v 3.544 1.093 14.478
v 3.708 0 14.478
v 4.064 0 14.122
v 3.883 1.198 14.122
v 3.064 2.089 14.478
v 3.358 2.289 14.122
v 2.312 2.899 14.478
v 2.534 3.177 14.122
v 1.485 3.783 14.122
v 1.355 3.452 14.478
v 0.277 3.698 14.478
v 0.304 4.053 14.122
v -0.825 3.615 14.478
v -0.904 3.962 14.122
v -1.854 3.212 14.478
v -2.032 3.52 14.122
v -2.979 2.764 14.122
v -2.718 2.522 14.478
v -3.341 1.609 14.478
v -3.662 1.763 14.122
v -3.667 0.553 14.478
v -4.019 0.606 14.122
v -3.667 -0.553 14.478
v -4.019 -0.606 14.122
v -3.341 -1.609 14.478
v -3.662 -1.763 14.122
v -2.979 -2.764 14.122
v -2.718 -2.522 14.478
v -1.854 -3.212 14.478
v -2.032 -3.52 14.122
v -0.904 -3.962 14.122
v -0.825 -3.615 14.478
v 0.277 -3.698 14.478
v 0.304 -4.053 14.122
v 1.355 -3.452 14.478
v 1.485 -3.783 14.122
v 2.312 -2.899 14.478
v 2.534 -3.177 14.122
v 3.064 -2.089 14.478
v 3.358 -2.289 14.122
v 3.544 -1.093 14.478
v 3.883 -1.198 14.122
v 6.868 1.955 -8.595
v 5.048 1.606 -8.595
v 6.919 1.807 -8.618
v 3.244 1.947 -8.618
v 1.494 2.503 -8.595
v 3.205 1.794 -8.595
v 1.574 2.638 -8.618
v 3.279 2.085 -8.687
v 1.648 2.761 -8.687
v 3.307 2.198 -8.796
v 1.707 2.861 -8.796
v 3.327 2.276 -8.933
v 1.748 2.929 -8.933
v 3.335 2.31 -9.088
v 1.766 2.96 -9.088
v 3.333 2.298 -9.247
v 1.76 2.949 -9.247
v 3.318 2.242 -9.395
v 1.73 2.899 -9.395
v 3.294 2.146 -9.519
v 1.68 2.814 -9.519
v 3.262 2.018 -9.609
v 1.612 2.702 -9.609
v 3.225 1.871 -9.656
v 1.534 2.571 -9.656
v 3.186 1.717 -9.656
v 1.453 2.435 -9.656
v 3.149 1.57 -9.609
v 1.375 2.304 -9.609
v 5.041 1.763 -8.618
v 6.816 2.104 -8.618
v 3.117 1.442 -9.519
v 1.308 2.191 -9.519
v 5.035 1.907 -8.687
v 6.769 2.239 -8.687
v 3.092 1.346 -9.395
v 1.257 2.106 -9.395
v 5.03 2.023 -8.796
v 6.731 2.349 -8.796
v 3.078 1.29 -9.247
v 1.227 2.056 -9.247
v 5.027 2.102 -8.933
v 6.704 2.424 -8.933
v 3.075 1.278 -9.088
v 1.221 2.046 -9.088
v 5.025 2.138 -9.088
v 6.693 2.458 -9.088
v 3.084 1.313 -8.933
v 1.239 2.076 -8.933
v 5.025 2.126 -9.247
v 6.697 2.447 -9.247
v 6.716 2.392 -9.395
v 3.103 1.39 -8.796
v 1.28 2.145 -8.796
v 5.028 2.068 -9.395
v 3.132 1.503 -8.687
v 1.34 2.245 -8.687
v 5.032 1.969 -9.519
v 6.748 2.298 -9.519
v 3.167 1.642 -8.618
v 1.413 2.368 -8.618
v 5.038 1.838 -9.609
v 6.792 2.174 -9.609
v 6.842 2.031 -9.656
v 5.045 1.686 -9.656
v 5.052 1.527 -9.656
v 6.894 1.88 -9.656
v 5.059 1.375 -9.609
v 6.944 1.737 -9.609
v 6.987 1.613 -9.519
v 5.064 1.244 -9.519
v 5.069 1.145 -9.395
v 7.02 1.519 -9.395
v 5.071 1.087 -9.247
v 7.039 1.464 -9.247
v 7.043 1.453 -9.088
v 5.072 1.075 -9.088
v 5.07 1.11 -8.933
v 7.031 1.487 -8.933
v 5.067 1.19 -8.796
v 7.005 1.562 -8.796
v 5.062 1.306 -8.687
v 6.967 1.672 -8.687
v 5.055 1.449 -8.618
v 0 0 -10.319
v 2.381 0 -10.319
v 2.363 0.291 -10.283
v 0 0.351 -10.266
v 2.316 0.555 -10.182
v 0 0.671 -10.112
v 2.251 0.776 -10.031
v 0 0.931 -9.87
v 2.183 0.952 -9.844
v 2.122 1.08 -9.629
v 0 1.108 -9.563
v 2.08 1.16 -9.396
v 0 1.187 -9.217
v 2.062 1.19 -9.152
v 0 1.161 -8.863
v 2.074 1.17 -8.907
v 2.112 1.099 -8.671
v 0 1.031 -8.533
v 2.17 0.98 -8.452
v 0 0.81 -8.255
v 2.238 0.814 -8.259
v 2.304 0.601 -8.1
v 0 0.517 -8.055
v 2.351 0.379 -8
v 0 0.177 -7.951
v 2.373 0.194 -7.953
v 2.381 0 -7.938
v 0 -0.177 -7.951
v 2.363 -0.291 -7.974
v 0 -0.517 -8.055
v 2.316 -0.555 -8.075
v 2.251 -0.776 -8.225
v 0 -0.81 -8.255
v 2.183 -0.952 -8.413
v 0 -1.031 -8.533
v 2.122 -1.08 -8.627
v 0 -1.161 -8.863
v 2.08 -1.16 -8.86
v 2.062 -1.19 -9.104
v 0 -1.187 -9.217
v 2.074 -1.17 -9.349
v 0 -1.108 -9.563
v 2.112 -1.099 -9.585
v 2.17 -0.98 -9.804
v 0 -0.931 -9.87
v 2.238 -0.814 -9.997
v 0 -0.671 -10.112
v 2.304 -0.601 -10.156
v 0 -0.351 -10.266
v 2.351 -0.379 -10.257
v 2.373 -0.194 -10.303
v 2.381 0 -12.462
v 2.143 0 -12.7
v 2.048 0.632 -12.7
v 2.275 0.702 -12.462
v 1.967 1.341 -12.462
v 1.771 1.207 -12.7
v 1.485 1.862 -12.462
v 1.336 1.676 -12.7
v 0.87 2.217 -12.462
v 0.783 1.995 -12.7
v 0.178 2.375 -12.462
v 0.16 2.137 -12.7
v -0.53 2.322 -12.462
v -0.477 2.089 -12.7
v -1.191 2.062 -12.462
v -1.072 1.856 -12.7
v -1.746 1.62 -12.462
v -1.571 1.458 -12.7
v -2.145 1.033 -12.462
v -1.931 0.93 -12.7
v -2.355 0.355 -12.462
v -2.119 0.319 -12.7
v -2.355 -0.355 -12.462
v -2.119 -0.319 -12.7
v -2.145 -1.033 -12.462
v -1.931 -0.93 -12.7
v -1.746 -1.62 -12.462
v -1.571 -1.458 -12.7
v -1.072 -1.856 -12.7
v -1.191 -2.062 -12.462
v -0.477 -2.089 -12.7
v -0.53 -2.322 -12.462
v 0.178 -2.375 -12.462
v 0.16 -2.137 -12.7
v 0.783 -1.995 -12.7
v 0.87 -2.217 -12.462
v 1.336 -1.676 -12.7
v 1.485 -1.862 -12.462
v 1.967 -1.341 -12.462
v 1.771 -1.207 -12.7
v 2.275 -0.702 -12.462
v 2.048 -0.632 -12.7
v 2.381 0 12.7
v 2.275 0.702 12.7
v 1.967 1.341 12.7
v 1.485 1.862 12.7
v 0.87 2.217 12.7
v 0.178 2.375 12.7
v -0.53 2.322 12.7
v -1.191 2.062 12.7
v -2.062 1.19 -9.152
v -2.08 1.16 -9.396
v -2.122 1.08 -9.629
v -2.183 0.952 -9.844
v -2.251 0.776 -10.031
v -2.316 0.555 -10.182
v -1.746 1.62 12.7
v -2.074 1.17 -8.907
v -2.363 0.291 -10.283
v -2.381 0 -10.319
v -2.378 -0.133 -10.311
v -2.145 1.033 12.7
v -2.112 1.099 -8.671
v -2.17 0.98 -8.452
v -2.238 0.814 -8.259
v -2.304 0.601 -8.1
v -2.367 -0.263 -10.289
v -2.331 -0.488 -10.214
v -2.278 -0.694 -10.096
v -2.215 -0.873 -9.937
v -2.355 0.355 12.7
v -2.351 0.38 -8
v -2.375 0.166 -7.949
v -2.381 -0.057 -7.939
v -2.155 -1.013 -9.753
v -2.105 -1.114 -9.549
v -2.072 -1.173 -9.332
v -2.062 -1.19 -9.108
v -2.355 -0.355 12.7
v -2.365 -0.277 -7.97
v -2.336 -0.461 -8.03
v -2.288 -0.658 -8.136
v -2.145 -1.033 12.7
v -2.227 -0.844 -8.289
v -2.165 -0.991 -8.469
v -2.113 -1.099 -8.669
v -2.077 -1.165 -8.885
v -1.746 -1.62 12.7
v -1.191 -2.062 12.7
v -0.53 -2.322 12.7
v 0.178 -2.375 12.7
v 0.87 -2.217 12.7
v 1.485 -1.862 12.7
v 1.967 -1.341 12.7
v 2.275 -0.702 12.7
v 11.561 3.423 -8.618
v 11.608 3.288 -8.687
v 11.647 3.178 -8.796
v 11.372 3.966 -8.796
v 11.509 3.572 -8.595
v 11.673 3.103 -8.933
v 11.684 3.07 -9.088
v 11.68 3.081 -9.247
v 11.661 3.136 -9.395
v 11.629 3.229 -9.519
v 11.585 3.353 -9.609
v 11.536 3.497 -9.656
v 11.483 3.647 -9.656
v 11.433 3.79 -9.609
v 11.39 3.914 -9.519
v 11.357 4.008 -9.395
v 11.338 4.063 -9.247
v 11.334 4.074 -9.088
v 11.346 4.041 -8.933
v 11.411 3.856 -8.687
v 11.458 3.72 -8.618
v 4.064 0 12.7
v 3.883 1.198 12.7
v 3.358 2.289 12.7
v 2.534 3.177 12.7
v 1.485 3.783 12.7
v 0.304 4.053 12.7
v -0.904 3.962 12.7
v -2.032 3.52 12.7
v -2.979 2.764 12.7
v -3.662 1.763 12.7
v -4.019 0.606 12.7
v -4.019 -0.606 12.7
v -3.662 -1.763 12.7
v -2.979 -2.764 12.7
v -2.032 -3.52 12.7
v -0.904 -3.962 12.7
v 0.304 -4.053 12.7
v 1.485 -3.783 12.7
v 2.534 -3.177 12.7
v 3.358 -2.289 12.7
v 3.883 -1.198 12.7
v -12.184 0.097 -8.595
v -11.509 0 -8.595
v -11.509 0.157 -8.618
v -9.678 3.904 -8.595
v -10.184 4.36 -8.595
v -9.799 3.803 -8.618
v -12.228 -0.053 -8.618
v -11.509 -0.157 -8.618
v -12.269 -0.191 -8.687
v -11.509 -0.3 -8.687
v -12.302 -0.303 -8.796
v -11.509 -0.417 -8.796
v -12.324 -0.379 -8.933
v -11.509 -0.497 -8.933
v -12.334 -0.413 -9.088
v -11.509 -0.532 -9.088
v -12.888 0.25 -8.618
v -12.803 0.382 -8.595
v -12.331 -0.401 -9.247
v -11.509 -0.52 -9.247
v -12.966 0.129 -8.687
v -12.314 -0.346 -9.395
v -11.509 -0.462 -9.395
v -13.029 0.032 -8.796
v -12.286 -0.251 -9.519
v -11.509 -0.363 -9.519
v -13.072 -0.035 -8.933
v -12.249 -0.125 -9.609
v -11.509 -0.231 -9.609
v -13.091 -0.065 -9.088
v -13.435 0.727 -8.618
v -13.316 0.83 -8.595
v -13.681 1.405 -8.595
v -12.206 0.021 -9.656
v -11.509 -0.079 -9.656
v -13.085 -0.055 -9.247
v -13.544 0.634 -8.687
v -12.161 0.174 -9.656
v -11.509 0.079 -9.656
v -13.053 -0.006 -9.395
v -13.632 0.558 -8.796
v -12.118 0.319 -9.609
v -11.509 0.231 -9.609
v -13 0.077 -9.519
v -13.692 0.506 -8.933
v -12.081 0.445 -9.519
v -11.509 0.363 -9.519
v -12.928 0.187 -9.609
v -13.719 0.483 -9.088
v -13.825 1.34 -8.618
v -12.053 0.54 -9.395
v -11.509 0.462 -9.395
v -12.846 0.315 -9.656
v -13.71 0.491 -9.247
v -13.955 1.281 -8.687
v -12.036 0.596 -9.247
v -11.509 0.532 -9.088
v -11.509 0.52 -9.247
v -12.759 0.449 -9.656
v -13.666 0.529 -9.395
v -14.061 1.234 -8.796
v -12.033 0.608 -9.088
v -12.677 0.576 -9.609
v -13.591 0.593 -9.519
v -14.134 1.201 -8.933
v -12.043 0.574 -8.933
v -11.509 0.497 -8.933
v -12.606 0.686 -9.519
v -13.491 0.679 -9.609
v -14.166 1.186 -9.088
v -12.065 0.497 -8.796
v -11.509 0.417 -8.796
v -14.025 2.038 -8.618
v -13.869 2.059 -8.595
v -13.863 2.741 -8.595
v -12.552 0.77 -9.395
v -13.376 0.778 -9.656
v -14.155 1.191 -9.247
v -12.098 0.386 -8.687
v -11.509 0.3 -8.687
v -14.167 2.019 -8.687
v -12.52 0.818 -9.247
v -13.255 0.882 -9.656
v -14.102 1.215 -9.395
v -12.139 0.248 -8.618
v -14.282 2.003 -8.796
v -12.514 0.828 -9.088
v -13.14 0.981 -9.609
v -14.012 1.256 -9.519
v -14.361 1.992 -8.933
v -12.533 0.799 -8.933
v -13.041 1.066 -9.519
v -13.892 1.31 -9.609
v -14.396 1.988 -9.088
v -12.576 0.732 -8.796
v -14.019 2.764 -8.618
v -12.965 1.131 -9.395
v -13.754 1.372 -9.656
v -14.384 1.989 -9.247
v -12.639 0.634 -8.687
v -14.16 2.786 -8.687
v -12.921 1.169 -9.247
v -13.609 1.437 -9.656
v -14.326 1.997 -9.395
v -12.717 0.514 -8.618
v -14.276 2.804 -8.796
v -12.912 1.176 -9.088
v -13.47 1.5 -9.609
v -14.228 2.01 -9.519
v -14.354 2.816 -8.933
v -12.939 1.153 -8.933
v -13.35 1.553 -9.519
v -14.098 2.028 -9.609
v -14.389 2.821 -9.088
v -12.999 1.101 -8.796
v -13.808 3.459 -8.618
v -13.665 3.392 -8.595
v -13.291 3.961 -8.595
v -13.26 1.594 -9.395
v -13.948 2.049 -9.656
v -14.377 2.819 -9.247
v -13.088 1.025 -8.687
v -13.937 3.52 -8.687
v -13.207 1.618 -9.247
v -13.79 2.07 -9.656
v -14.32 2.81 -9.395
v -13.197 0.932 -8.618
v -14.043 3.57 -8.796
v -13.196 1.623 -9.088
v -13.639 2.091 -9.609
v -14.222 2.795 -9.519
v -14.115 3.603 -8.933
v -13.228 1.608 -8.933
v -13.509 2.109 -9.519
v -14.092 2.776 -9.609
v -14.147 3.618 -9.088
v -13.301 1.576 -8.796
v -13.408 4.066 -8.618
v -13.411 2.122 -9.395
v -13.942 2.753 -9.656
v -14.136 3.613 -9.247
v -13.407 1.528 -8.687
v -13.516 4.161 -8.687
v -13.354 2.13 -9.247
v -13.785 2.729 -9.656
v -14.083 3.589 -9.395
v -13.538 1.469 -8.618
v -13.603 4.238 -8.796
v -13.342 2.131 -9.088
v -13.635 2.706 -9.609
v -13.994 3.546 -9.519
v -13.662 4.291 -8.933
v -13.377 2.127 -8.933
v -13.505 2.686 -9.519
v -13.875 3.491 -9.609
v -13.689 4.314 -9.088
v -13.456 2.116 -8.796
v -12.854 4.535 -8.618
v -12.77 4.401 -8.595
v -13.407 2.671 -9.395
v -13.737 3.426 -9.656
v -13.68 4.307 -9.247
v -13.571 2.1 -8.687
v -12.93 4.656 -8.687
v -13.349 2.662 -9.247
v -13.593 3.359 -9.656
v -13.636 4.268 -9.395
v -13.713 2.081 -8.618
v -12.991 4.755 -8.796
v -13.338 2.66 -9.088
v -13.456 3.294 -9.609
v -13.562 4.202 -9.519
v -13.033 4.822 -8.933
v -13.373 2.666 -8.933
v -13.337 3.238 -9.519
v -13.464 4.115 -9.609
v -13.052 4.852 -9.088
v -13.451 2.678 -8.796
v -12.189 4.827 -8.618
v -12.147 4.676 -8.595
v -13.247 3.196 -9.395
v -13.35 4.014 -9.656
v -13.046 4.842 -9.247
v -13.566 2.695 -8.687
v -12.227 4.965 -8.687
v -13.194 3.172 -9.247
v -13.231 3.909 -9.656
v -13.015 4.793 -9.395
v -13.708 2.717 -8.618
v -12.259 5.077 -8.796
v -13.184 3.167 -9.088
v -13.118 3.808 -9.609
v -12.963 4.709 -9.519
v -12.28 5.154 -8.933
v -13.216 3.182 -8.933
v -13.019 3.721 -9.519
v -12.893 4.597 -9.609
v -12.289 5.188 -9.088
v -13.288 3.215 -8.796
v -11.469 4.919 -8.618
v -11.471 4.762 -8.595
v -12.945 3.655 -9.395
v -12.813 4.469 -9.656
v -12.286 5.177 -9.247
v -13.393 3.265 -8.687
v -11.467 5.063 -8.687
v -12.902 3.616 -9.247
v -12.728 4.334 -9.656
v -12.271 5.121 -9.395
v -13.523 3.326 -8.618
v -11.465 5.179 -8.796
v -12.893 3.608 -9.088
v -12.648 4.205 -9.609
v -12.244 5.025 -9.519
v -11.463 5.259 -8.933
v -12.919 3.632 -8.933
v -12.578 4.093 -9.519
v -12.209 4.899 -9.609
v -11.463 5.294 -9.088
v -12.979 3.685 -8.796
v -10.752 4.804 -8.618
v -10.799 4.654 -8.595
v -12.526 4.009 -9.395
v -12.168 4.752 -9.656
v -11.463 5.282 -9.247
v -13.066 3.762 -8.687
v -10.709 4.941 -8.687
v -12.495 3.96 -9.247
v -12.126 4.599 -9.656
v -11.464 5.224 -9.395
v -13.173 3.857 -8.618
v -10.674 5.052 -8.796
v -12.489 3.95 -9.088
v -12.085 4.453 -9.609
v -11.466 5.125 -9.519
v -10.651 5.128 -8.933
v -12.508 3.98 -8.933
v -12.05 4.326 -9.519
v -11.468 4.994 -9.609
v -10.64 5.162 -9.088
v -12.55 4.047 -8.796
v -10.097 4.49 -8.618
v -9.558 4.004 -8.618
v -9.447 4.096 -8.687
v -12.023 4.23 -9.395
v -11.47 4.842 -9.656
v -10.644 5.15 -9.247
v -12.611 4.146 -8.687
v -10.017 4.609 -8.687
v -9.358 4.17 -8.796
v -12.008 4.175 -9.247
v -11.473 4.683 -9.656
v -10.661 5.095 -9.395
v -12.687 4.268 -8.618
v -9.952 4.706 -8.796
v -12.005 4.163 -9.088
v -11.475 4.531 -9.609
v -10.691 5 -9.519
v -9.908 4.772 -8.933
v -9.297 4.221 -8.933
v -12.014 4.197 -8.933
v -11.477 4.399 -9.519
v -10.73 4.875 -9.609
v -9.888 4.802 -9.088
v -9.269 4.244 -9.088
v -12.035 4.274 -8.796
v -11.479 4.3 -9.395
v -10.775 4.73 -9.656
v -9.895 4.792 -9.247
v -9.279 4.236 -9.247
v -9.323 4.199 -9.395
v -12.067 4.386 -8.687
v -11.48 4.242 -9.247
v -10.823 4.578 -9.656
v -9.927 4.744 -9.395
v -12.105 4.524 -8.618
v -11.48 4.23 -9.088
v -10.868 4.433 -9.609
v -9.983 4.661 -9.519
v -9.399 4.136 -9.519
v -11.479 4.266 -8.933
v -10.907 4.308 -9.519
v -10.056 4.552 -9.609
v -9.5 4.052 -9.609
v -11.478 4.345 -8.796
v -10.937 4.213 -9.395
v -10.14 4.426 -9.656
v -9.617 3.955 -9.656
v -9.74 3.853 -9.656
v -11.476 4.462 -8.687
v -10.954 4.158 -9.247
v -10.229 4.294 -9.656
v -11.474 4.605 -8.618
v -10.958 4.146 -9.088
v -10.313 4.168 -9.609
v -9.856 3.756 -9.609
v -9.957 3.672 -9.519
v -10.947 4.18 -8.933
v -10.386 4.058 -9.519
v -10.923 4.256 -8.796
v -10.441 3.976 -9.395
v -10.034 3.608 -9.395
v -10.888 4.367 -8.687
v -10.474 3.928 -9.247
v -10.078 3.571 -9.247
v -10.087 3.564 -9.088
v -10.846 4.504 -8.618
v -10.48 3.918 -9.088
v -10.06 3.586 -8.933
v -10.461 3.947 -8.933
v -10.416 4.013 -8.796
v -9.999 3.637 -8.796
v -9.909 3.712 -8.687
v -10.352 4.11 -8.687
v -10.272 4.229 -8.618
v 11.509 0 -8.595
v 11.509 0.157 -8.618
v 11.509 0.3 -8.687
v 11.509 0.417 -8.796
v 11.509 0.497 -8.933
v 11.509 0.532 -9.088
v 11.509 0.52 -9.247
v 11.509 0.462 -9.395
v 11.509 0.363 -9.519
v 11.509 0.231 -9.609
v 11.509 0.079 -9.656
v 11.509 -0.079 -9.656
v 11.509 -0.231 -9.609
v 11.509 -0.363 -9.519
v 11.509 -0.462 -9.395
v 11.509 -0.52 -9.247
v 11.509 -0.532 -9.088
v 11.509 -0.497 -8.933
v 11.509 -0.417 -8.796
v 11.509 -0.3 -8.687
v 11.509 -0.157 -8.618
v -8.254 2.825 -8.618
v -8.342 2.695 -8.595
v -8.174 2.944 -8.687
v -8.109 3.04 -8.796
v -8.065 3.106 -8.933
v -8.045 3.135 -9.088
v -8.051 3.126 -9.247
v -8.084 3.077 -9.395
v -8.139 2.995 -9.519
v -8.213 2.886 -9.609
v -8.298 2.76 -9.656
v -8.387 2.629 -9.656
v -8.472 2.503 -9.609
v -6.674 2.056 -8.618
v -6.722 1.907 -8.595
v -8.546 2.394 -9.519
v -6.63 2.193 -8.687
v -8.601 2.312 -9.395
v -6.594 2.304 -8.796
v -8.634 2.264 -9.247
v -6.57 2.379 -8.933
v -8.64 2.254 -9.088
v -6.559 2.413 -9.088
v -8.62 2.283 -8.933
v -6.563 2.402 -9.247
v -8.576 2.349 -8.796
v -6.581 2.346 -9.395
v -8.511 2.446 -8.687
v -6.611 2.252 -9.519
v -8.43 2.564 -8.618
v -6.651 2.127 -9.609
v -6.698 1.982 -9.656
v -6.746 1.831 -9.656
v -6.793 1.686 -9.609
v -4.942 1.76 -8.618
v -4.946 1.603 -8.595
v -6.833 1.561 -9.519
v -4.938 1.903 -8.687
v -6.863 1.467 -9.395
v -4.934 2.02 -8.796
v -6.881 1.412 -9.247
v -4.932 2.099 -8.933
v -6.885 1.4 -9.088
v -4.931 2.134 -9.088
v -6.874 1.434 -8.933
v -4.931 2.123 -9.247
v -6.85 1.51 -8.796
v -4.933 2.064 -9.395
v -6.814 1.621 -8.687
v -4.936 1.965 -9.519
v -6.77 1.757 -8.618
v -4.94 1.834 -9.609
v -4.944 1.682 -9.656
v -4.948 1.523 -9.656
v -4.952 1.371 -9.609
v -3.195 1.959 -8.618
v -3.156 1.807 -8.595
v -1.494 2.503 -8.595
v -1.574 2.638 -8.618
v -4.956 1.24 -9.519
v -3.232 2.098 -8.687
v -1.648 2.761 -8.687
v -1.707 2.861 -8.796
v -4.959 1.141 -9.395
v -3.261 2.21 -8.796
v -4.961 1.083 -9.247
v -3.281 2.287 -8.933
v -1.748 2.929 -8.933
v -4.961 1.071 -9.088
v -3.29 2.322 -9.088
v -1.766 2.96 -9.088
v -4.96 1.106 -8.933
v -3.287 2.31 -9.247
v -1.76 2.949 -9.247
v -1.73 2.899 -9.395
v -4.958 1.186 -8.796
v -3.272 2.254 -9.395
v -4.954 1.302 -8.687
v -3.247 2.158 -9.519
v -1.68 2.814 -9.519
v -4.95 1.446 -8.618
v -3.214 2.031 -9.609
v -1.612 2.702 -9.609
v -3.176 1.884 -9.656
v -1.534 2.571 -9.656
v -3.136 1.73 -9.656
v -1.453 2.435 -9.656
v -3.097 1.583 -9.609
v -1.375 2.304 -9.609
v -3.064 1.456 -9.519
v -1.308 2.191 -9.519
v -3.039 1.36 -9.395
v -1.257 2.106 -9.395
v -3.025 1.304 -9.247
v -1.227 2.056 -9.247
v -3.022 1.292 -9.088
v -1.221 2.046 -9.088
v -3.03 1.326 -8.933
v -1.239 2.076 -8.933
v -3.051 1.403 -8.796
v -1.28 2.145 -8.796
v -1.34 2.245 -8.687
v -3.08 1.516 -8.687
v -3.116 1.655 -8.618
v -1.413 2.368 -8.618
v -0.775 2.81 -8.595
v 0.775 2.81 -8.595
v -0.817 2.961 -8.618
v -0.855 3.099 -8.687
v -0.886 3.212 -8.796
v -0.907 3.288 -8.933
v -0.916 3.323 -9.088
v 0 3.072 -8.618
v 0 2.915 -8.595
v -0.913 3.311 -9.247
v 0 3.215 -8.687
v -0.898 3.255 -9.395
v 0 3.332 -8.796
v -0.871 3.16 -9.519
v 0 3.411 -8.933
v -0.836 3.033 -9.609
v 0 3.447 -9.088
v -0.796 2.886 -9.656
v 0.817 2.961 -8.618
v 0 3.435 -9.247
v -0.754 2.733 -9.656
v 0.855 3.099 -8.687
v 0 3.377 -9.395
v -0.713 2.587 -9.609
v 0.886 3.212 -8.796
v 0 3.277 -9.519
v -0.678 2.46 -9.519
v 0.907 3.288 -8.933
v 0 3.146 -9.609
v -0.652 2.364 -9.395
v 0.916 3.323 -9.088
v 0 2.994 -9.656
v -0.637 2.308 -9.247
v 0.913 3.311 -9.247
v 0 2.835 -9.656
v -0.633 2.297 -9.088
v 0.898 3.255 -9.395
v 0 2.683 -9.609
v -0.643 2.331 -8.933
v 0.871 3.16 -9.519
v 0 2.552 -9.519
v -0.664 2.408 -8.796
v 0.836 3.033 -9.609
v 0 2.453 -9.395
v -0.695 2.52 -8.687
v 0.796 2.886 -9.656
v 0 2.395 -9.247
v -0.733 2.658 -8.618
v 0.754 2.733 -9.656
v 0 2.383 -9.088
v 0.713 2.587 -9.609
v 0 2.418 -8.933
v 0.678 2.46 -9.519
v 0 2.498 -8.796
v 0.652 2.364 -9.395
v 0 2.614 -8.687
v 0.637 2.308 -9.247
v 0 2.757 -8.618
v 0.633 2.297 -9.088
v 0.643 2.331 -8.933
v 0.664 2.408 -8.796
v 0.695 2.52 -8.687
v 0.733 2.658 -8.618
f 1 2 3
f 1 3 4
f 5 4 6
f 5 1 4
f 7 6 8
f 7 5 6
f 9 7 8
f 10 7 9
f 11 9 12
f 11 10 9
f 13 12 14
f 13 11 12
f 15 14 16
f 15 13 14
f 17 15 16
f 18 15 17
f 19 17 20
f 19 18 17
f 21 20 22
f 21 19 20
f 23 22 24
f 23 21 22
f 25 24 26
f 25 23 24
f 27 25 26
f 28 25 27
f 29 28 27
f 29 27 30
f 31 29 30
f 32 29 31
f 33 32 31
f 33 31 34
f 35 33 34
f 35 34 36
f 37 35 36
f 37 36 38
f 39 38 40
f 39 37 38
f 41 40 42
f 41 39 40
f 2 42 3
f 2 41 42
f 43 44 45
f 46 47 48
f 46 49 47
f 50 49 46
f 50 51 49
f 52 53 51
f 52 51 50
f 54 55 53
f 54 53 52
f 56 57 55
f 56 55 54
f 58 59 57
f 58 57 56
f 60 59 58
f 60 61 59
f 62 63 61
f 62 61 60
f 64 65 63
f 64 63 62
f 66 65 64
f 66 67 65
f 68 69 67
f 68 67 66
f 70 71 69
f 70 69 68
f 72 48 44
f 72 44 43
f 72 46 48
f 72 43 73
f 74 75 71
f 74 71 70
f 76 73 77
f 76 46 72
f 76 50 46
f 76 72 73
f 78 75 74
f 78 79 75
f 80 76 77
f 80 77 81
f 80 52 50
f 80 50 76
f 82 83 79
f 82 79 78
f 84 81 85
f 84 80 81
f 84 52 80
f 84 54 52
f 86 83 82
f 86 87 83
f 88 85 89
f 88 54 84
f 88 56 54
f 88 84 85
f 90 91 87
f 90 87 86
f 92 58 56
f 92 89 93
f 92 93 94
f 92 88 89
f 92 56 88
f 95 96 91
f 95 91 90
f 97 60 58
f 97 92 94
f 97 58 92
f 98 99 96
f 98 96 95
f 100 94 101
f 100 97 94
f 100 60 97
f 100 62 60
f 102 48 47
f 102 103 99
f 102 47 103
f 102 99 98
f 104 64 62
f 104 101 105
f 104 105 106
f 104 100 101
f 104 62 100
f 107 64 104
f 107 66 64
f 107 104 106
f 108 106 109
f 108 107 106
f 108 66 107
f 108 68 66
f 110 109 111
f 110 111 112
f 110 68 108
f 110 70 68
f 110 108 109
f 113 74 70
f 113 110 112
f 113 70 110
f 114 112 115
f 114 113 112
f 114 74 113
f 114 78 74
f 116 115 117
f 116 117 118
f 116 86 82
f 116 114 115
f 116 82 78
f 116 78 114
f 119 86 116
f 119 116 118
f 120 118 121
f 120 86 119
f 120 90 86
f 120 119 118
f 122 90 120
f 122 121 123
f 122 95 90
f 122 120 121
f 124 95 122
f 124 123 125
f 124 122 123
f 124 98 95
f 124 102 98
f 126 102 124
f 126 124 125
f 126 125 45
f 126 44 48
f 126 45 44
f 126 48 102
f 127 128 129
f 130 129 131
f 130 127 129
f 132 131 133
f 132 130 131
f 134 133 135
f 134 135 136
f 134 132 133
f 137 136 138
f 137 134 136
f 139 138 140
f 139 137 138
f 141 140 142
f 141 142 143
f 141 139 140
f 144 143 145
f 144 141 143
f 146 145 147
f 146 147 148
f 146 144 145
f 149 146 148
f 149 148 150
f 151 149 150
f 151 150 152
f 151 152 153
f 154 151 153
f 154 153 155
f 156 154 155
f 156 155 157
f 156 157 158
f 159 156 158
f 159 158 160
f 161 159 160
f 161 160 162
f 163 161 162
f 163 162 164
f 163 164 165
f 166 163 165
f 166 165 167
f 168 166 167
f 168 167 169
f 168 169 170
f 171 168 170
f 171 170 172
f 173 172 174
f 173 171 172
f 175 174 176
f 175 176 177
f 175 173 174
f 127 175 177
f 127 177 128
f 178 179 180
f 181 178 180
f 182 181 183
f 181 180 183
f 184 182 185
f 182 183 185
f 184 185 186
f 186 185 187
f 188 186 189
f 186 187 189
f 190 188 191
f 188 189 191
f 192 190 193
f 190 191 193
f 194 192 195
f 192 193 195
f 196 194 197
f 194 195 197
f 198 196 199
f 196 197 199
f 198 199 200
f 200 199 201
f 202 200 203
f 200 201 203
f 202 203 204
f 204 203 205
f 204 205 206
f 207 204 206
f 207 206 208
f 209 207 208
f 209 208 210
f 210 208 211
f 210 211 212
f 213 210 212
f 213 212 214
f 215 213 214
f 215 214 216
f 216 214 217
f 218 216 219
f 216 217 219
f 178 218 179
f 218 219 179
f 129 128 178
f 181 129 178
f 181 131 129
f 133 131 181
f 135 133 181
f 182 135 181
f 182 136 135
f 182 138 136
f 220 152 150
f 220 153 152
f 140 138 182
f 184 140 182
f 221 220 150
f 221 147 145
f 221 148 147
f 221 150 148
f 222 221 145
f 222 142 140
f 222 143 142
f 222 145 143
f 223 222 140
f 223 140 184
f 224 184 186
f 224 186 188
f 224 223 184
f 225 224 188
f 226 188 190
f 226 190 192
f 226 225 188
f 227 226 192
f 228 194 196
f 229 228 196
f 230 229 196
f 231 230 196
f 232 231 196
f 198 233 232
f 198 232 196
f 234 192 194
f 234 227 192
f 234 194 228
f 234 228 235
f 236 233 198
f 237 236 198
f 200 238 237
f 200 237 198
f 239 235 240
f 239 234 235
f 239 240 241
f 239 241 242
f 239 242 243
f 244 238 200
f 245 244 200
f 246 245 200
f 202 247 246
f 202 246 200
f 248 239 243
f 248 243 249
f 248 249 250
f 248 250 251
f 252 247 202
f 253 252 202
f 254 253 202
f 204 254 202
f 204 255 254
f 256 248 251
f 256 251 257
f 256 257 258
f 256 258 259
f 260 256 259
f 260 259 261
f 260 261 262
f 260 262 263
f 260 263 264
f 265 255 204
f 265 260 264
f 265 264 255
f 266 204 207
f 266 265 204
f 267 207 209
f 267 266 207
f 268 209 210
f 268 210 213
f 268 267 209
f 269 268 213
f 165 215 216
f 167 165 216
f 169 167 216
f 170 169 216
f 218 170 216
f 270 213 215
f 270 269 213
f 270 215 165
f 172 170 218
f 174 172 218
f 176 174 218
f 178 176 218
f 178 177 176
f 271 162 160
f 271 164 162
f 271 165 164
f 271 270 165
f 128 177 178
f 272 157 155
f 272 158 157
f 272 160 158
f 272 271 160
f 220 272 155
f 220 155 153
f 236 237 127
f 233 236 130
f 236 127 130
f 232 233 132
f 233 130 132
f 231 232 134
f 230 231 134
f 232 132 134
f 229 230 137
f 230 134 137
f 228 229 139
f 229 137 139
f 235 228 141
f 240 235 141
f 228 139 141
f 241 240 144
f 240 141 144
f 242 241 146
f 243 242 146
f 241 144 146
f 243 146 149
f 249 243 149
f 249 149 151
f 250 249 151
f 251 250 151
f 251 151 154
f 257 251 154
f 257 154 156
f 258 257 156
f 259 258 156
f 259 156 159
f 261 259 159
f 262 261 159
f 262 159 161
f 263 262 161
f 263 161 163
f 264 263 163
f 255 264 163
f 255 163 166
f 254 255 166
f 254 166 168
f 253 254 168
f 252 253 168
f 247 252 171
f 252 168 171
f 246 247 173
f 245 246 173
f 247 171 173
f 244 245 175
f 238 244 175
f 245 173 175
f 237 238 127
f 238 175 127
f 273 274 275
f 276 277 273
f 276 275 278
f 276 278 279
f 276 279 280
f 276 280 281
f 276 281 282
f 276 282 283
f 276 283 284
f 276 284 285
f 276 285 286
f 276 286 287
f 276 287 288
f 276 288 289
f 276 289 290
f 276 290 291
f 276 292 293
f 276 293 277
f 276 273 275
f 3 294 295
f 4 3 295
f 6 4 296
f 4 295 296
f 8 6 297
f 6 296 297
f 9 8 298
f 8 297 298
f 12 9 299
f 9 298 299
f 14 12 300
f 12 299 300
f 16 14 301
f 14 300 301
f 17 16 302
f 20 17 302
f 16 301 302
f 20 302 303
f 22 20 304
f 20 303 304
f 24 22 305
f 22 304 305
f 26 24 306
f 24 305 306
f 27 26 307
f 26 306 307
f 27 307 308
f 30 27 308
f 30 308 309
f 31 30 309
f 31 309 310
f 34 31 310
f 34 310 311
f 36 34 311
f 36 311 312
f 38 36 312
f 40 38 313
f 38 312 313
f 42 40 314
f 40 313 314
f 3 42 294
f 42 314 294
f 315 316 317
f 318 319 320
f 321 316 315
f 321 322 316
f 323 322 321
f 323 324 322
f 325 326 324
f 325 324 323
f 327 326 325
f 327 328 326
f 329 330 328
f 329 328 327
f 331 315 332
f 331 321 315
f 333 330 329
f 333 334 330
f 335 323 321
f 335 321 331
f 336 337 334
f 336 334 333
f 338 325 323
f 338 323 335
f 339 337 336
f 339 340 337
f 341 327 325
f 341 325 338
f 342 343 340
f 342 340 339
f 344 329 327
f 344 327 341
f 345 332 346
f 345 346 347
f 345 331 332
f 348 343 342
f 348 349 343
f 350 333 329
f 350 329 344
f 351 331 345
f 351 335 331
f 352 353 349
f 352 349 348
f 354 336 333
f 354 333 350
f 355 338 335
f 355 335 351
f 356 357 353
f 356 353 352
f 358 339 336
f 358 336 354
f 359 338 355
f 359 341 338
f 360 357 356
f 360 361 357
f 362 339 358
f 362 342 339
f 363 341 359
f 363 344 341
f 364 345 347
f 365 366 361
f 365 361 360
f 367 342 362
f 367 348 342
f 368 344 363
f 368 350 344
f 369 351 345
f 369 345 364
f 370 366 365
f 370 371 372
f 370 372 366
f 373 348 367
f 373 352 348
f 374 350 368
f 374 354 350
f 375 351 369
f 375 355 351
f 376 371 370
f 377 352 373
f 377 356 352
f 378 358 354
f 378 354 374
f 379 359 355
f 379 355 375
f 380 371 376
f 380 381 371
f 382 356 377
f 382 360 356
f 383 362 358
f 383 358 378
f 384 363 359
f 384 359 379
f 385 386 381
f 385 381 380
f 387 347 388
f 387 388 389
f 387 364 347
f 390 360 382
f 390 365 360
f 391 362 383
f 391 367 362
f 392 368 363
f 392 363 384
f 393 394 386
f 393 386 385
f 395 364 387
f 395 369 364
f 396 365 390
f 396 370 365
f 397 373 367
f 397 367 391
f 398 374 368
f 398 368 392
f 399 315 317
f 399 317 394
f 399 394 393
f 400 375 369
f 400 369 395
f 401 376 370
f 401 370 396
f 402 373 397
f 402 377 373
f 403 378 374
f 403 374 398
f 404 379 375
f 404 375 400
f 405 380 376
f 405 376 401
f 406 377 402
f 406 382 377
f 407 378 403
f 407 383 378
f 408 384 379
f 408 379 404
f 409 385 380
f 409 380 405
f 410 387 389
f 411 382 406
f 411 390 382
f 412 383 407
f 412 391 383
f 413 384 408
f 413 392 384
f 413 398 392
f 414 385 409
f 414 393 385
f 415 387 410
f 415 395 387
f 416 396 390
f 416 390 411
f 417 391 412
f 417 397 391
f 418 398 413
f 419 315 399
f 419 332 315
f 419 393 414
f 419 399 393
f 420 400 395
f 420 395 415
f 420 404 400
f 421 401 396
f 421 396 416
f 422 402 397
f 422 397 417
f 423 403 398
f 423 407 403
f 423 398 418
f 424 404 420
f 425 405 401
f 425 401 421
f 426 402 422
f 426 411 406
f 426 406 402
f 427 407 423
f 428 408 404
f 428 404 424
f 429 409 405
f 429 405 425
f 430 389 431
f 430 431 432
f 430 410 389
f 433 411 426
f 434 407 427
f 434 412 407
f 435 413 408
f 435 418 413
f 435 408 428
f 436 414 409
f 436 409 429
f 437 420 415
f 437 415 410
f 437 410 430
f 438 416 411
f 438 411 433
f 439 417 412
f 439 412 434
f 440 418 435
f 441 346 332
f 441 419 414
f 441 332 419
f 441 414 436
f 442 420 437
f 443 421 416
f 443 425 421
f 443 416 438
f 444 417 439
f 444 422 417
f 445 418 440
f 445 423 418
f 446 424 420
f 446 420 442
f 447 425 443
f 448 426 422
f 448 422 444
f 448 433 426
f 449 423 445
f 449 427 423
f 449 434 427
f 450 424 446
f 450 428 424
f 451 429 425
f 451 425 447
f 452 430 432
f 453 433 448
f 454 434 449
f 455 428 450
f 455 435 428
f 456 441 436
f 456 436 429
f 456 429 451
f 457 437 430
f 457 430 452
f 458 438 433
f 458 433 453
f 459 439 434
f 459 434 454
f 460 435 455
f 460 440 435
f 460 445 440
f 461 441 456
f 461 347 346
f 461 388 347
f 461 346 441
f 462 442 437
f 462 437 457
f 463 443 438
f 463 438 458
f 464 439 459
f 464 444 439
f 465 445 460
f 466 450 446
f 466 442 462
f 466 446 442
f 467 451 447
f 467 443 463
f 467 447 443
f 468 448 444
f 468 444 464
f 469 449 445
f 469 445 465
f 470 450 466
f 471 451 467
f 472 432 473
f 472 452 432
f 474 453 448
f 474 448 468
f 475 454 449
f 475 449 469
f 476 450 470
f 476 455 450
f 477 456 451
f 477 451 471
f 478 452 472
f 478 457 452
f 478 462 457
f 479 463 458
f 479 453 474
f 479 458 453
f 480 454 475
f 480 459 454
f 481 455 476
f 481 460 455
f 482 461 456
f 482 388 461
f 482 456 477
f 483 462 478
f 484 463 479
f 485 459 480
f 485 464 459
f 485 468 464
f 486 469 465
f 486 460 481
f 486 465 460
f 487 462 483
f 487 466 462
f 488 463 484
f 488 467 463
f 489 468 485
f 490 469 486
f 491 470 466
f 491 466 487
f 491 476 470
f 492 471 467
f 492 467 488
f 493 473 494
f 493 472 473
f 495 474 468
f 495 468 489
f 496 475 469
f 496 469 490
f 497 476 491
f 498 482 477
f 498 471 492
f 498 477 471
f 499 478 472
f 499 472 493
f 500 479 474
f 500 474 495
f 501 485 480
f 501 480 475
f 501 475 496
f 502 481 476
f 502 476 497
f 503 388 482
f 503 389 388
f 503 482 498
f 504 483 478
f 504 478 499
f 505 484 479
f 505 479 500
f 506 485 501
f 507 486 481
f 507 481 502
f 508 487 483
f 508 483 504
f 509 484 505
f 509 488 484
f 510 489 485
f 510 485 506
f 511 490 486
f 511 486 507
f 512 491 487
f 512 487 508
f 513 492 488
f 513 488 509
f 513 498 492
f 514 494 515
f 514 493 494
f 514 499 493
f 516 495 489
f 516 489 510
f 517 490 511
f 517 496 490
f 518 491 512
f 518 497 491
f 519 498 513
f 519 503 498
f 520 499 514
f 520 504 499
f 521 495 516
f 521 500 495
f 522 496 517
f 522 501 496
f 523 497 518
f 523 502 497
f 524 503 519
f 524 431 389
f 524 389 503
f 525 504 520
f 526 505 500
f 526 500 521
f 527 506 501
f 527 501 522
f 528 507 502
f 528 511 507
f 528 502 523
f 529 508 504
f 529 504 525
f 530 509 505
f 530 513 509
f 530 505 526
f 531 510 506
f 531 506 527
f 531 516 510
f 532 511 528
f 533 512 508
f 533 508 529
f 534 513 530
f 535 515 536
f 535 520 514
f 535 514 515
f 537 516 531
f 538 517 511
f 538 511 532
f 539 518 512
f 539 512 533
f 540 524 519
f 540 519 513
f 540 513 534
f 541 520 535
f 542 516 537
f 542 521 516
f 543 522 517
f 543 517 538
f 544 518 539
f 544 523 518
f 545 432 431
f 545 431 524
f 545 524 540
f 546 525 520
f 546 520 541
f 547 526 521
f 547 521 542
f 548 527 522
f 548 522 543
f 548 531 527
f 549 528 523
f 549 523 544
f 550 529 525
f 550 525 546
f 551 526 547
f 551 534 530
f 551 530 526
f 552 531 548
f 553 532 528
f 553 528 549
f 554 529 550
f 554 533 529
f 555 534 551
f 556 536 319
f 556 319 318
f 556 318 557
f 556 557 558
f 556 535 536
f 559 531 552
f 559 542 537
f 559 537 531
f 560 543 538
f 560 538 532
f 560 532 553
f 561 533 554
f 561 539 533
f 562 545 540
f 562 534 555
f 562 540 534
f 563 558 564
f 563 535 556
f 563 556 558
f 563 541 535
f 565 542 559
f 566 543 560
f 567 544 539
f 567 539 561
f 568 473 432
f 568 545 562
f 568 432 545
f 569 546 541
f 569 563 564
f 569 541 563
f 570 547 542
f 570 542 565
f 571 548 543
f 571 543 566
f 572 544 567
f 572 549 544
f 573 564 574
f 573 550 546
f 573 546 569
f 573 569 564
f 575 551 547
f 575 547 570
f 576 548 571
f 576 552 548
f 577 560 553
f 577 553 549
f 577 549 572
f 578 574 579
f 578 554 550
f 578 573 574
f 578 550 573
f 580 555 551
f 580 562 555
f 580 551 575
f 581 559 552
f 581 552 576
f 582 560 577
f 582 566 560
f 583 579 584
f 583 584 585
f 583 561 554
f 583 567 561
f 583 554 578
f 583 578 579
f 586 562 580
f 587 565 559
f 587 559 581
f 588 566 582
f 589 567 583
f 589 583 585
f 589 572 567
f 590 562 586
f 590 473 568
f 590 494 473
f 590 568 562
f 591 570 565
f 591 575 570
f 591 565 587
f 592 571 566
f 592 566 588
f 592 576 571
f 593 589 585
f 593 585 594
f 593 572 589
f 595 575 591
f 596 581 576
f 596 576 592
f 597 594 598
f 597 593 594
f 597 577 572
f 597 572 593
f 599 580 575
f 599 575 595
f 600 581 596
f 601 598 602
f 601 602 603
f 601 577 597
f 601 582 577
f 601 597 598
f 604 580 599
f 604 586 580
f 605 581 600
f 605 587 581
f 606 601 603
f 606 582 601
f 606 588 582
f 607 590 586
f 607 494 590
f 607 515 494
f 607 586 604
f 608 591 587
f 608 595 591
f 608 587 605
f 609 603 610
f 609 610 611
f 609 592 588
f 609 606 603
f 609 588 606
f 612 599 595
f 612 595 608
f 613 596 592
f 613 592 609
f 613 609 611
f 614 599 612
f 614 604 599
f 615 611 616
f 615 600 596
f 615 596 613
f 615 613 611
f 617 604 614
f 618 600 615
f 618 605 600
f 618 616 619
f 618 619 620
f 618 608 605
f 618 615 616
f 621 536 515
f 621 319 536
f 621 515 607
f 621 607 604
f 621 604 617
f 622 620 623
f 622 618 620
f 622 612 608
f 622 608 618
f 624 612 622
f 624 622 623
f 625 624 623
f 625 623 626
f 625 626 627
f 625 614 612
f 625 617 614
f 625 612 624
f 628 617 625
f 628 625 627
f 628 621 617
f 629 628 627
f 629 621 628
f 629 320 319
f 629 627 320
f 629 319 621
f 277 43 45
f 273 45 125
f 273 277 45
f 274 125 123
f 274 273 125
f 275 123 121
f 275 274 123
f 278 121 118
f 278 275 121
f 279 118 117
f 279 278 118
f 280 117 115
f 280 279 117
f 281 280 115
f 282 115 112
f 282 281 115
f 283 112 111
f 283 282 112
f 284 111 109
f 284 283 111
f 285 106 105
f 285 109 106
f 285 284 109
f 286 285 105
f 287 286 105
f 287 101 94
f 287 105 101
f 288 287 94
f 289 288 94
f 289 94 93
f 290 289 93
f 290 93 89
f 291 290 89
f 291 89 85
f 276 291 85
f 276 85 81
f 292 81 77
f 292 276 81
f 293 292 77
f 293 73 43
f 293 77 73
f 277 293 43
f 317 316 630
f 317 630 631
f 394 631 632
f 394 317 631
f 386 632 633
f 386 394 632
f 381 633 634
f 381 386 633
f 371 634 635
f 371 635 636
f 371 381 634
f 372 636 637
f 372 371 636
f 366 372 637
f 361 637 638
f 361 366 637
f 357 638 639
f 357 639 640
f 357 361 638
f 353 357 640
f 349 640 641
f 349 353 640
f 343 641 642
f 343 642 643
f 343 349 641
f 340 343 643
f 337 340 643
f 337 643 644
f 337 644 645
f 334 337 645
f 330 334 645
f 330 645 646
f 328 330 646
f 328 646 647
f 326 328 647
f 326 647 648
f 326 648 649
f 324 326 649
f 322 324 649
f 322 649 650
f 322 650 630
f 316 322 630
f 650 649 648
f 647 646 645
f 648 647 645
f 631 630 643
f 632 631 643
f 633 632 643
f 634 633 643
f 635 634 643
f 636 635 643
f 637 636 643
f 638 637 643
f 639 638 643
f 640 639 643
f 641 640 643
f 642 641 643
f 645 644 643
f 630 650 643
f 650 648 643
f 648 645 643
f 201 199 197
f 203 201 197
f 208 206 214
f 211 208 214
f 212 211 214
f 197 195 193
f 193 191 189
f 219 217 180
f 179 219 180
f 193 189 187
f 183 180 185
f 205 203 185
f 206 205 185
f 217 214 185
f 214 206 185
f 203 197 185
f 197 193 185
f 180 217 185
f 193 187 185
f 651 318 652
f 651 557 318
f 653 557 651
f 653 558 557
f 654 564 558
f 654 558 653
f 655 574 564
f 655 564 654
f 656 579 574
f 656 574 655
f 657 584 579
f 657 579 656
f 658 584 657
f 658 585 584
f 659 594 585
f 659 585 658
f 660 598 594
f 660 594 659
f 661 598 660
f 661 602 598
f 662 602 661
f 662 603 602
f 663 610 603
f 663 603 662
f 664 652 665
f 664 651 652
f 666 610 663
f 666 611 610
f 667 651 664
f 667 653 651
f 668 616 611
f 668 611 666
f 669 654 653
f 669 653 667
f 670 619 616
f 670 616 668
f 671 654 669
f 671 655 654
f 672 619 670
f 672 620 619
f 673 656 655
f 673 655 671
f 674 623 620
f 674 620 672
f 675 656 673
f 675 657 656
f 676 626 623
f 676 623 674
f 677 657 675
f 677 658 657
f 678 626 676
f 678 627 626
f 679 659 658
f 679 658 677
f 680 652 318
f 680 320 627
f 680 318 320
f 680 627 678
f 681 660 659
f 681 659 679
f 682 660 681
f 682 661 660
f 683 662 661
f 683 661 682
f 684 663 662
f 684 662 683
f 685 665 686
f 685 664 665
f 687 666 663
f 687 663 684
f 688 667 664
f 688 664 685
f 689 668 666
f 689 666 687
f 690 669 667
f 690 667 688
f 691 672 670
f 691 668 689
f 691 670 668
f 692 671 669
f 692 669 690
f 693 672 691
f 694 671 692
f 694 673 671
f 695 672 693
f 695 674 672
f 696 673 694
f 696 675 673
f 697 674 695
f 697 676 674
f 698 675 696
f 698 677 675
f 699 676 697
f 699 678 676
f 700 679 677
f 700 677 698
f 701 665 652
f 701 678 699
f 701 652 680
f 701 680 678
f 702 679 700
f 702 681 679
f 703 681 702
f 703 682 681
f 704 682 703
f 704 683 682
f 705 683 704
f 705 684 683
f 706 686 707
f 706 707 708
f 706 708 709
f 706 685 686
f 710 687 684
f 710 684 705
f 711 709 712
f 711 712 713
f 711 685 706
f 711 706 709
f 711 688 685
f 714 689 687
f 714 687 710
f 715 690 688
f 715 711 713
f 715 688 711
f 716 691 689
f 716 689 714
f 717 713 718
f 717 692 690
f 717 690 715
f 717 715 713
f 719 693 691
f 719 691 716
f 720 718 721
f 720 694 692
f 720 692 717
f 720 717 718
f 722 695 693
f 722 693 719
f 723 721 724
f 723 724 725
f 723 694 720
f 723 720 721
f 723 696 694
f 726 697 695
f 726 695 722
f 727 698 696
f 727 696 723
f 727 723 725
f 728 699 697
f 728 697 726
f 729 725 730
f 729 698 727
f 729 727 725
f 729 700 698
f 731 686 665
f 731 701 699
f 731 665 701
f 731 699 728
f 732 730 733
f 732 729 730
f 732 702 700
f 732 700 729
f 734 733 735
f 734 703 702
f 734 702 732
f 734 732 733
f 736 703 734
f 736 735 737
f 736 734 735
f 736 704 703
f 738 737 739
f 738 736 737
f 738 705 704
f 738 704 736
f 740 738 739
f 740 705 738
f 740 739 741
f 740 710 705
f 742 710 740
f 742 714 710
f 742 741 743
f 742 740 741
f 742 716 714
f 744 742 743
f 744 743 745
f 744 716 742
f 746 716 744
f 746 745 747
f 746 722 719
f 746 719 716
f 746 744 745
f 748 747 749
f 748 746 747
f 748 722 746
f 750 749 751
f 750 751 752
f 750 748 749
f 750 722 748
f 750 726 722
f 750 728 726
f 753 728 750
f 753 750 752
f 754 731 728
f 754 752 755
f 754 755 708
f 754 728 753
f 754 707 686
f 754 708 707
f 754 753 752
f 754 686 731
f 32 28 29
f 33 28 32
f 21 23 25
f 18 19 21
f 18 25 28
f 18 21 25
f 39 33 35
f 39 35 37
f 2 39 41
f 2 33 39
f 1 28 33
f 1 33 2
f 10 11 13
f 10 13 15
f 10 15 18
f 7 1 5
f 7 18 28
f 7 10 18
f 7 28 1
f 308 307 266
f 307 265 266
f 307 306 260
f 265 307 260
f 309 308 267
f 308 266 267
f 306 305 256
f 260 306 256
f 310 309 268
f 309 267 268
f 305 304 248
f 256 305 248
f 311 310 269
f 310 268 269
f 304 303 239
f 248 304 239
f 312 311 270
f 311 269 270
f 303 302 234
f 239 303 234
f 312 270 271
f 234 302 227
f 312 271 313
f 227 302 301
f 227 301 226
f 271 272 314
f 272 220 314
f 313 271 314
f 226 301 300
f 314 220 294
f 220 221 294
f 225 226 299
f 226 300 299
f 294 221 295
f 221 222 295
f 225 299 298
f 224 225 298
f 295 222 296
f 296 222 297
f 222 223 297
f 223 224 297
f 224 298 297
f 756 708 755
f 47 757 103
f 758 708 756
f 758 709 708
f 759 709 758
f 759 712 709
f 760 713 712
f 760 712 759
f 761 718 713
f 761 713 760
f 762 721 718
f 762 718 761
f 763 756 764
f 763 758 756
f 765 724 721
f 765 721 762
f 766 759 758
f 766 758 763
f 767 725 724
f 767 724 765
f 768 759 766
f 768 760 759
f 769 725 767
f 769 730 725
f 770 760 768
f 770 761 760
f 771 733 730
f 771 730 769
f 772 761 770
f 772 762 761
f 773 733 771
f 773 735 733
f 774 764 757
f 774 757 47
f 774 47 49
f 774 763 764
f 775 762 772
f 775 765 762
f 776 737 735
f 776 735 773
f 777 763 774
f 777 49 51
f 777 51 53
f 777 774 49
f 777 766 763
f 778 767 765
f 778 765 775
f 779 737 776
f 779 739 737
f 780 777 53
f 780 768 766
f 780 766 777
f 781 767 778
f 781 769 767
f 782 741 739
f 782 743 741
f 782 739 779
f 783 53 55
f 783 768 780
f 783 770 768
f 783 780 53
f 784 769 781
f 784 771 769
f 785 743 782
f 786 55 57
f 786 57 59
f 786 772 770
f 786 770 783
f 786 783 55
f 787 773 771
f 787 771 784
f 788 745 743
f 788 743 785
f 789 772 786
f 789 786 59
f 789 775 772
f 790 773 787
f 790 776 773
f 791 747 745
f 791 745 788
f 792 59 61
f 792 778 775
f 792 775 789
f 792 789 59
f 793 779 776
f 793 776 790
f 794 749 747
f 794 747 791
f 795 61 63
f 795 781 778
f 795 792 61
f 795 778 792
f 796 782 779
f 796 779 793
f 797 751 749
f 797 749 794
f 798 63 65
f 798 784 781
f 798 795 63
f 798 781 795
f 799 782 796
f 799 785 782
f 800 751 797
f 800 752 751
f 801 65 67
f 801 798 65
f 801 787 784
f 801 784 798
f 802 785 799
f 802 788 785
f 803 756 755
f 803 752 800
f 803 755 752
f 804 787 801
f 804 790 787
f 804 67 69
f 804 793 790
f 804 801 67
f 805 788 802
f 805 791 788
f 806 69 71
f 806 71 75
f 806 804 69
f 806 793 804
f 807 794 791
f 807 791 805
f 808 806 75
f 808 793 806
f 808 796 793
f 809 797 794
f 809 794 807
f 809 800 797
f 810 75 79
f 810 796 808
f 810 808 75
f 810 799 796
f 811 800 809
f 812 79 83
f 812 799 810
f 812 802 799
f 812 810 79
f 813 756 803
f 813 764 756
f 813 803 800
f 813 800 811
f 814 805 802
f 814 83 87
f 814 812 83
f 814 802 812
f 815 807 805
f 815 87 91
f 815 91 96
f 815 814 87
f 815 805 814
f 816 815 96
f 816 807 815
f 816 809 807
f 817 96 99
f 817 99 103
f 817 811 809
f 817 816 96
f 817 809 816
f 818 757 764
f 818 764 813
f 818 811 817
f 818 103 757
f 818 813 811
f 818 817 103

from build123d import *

# Parameters (mm, degrees)
SKETCH1_R           = 2.38125
EXTRUDE1_DEPTH      = 12.7
SKETCH2_R           = 4.064
EXTRUDE2_DEPTH      = 1.778
CHAMFER1_SIZE       = 0.3556
SKETCH3_R           = 1.190625
EXTRUDE3_DEPTH      = 5.064
EXTRUDE3_DEPTH_BACK = 5.064
CHAMFER2_SIZE       = 0.238125
SKETCH7_R           = 0.5334


with BuildPart() as part:
    # Sketch1 → Extrude1 (new body, symmetric)
    with BuildSketch(Plane.XY):
        Circle(SKETCH1_R)
    extrude(amount=EXTRUDE1_DEPTH, both=True)

    # Sketch2 → Extrude2 (add)
    with BuildSketch(Plane.XY.offset(12.7)):
        Circle(SKETCH2_R)
    extrude(amount=EXTRUDE2_DEPTH)

    # Chamfer1
    chamfer1_edges = [part.edges().sort_by_distance(p)[0] for p in [
        (-4.064, 0, 14.478),
    ]]
    chamfer(chamfer1_edges, length=CHAMFER1_SIZE)

    # Sketch3 → Extrude3 (cut, two sides)
    with BuildSketch(Plane(origin=(0, 0, 0), x_dir=(0, 0, -1), z_dir=(1, 0, 0))) as extrude3_sk:
        with Locations((9.128125, 0)):
            Circle(SKETCH3_R)
    extrude(amount=EXTRUDE3_DEPTH, mode=Mode.SUBTRACT)
    extrude(extrude3_sk.sketch, amount=-EXTRUDE3_DEPTH_BACK, mode=Mode.SUBTRACT)

    # Chamfer2
    chamfer2_edges = [part.edges().sort_by_distance(p)[0] for p in [
        (-2.38125, 0, -12.7),
    ]]
    chamfer(chamfer2_edges, length=CHAMFER2_SIZE)


with BuildPart() as body_2:
    # Sweep1: sweep along a path in Sketch6
    with BuildLine(Plane.XY.offset(-9.128125)) as sweep1_path:
        Line((11.509375, 0), (-11.509375, 0))
        ThreePointArc((-11.509375, 0), (-13.665265976, 3.392430331), (-9.678408448, 3.903719392))
        ThreePointArc((-9.678408448, 3.903719392), (-5.844791833, 1.691759471), (-1.493743003, 2.502781745))
        ThreePointArc((-1.493743003, 2.502781745), (0, 2.91465), (1.493743003, 2.502781745))
        ThreePointArc((1.493743003, 2.502781745), (4.120038067, 1.633068096), (6.867741763, 1.955483963))
        Line((6.867741763, 1.955483963), (11.509375, 3.571875))
    # Sketch7 → Sweep1 (sweep)
    with BuildSketch(Plane(origin=(11.509375, 0, -9.128125), x_dir=(0, 0, 1), z_dir=(-1, 0, 0))):
        Circle(SKETCH7_R)
    sweep(path=sweep1_path.line)


solid = Compound([part.part, body_2.part])
